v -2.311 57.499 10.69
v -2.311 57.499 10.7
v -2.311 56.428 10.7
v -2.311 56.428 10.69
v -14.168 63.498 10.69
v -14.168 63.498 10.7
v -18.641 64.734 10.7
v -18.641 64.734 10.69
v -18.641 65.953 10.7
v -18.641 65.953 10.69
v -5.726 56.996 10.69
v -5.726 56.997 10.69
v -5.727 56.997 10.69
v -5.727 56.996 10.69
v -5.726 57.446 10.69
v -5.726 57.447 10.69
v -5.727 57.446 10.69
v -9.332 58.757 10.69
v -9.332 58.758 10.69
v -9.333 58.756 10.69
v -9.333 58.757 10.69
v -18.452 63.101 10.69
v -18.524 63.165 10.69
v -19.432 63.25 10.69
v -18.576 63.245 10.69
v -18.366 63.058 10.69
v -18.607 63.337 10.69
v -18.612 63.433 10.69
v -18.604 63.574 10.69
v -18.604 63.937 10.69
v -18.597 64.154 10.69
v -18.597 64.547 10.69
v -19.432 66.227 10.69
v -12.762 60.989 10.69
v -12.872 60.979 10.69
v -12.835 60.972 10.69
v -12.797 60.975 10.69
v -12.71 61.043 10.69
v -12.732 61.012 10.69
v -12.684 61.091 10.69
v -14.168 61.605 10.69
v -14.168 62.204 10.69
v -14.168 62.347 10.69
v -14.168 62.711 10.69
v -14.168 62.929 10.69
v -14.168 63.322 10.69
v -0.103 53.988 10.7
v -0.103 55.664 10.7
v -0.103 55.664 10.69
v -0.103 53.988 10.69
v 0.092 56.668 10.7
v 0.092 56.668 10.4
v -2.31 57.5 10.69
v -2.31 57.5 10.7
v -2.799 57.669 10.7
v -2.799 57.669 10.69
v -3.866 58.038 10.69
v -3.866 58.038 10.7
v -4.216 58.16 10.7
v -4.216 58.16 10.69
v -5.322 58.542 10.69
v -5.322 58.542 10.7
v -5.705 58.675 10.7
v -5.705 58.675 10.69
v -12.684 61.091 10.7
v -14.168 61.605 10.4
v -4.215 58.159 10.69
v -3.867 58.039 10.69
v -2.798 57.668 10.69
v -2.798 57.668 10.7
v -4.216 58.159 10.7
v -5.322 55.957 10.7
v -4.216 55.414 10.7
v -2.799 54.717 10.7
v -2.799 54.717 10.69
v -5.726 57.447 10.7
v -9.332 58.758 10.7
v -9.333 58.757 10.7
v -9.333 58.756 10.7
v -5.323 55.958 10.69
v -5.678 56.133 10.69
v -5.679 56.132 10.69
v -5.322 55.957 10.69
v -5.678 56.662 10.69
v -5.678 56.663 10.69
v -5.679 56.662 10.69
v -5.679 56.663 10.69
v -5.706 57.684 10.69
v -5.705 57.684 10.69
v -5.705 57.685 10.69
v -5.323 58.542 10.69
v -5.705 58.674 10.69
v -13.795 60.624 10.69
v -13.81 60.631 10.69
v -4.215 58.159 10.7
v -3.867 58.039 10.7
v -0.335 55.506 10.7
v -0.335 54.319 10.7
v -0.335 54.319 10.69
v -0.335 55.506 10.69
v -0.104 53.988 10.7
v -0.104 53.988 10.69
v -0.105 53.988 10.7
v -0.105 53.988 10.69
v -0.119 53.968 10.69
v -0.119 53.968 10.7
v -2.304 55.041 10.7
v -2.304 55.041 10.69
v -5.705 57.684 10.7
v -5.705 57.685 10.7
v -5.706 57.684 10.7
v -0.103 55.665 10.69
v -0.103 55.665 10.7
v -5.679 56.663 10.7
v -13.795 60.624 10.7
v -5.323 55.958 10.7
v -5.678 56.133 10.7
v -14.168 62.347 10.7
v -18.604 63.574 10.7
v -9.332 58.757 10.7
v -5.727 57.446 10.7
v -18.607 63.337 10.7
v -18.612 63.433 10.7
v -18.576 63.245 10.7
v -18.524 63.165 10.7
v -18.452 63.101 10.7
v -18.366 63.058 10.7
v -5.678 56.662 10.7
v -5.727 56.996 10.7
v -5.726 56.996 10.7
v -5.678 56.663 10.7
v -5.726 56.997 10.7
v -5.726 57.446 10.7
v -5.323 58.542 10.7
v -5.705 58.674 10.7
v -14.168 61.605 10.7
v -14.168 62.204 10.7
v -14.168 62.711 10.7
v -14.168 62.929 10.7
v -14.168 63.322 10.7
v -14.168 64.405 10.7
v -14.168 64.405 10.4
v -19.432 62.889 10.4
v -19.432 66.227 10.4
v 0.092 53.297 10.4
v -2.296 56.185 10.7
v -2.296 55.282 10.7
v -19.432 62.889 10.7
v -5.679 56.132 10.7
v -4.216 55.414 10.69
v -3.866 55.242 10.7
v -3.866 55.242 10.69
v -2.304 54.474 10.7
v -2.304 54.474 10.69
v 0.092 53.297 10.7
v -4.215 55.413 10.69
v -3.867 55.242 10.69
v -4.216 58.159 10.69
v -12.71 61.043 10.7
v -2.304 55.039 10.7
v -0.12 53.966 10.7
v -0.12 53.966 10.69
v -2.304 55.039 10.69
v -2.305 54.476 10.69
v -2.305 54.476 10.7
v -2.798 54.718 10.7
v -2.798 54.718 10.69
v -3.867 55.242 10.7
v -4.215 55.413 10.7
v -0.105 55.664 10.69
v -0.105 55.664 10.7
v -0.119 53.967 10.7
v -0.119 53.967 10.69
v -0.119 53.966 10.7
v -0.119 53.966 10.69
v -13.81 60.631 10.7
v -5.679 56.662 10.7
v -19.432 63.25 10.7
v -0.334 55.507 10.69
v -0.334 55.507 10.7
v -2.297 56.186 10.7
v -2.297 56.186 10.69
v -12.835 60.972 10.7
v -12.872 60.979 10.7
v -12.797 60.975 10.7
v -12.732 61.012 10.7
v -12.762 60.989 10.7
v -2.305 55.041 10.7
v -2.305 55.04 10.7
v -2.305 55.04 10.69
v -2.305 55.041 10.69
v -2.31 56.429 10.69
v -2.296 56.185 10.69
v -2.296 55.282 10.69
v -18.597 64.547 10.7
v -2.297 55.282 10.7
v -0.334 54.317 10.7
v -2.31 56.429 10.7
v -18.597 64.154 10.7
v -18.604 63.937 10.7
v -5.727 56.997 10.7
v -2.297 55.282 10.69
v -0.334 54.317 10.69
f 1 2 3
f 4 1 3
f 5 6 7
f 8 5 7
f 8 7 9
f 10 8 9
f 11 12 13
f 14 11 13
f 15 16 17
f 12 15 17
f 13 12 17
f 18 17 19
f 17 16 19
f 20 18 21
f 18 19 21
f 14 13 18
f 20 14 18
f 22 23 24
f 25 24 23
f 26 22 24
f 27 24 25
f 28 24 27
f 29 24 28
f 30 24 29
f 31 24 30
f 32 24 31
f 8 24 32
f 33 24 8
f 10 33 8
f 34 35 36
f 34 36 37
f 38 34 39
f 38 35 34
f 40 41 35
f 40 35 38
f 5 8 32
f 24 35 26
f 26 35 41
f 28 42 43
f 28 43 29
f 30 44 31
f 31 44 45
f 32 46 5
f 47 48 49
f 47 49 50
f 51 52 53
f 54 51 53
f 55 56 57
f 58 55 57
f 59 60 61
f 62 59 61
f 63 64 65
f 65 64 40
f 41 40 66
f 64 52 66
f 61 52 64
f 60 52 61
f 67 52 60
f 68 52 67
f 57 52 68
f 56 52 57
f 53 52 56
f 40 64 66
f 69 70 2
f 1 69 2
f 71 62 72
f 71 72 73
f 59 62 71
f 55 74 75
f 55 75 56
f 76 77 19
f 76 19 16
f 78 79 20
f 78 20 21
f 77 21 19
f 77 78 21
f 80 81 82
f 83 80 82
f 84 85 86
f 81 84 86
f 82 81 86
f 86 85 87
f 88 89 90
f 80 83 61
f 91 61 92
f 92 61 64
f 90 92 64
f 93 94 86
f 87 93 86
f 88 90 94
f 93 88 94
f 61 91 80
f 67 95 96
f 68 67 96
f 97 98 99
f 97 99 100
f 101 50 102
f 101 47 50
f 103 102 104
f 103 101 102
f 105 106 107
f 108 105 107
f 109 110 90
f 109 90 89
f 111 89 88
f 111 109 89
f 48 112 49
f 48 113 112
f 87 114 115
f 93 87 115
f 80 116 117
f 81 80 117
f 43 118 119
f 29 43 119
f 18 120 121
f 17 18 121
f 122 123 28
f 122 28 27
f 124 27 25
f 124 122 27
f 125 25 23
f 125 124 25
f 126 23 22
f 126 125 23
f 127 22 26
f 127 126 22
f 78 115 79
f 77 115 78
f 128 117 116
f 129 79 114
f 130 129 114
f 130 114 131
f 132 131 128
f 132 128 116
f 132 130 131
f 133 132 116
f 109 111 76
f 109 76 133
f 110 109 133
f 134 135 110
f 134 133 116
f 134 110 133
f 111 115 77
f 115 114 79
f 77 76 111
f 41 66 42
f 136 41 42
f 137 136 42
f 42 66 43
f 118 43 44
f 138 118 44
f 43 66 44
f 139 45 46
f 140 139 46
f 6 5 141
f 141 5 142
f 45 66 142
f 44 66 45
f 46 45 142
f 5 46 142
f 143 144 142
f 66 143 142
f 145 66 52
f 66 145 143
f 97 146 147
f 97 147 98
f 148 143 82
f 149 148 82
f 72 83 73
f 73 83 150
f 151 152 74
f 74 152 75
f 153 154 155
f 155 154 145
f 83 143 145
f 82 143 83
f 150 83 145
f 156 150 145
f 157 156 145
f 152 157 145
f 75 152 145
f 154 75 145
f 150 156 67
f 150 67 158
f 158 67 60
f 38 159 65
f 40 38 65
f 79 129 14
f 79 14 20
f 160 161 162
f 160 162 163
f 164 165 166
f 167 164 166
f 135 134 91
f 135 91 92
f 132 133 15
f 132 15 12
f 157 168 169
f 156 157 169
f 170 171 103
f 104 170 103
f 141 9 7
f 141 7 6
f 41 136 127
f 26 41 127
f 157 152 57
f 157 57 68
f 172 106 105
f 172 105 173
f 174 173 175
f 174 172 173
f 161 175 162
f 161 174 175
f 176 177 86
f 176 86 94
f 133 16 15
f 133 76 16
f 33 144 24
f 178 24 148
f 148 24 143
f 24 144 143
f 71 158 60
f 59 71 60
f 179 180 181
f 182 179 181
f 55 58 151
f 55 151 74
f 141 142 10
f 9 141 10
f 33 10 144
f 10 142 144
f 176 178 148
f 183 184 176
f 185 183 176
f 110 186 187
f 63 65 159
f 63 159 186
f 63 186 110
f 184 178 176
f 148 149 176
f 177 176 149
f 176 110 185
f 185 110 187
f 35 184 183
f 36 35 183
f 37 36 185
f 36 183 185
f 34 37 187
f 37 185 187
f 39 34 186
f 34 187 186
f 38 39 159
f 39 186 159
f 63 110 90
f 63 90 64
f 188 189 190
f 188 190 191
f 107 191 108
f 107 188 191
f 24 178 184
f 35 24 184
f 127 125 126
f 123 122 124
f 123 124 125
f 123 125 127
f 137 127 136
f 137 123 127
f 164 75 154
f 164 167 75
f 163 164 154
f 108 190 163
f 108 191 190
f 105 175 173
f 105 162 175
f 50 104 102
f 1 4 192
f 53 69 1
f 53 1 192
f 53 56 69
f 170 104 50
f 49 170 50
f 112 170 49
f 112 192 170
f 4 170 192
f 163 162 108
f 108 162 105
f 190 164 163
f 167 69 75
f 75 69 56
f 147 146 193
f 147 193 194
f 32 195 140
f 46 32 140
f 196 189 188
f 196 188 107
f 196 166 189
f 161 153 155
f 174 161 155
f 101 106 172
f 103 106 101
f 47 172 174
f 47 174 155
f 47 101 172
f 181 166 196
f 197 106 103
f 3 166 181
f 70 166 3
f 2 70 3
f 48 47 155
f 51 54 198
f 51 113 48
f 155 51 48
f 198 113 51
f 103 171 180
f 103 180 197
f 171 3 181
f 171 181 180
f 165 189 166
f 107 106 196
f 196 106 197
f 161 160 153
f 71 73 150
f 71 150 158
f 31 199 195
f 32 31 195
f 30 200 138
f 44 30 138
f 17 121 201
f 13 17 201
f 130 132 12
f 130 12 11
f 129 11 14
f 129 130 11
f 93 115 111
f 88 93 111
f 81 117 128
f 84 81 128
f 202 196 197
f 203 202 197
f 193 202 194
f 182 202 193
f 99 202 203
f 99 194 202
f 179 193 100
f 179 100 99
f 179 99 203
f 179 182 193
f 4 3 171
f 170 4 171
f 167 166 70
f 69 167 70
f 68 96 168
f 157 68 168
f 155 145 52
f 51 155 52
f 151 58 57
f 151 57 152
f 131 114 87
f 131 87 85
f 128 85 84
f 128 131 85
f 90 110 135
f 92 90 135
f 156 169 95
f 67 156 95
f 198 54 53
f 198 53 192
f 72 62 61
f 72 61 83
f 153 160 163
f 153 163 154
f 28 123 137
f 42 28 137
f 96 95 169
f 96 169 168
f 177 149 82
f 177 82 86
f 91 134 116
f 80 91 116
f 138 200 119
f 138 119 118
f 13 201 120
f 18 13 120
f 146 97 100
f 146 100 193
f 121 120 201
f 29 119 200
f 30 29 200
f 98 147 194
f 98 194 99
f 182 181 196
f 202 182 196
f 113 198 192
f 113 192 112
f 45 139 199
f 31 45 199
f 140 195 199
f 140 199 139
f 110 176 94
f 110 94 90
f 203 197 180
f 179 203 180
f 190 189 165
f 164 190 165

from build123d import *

# Parameters (mm, degrees)
PAD004_DEPTH    = 0.3
POCKET012_DEPTH = 0.01
POCKET013_DEPTH = 0.01


with BuildPart() as part:
    # Sketch014 (on Face1 of Binder004) → Pad004 (new body)
    with BuildSketch(Plane.XY.offset(10.4)):
        Polygon((-19.4323216564, 66.2270001367), (-19.4323216564, 62.889181066), (0.0923997574, 53.2967653506), (0.0923997574, 56.6681716802), (-14.1681248714, 61.6047050946), (-14.1681248714, 64.4047050946), align=None)
    extrude(amount=PAD004_DEPTH)

    # Sketch015 (on Face8 of Pad004) → Pocket012 (cut)
    with BuildSketch(Plane.XY.offset(10.7)):
        Polygon((-5.32199, 58.5424586824), (-5.32199, 55.9568328772), (-5.679085, 56.1322721891), (-5.679085, 56.662136), (-13.809804, 60.630539), (-5.70539, 57.684792), (-5.70539, 58.6751793894), align=None)
        with BuildLine():
            ThreePointArc((-5.7045356509, 57.6847918915), (-5.7048998518, 57.6840920792), (-5.7056819786, 57.6839888464))
            Line((-13.794928, 60.624184), (-5.7056819786, 57.6839888464))
            Line((-5.6787103299, 56.6629035278), (-13.794928, 60.624184))
            ThreePointArc((-5.6787103299, 56.6629035278), (-5.6783605329, 56.6625884398), (-5.6782307979, 56.6621358835))
            Line((-5.6782307759, 56.1328043107), (-5.6782307979, 56.6621358835))
            Line((-5.3228443024, 55.9582044294), (-5.6782307759, 56.1328043107))
            Line((-5.3228443024, 58.5418503733), (-5.3228443024, 55.9582044294))
            Line((-5.3228443024, 58.5418503733), (-5.704535674, 58.6739796165))
            Line((-5.7045356509, 57.6847918915), (-5.704535674, 58.6739796165))
        make_face(mode=Mode.SUBTRACT)
        Polygon((-2.2970993786, 56.1862906865), (-2.2970993786, 55.2818480058), (-0.333954854, 54.3173631361), (-0.333954854, 55.5067134062), align=None)
        Polygon((-0.3348091564, 55.5061050972), (-2.2962450762, 56.1850909136), (-2.2962450762, 55.2823801275), (-0.3348091564, 54.3187346883), align=None, mode=Mode.SUBTRACT)
        with BuildLine():
            Line((-4.2160763024, 55.4130822888), (-4.2160763024, 58.1593313181))
            ThreePointArc((-4.2160763024, 58.1593313181), (-4.215717524, 58.1600272266), (-4.2149425386, 58.1601386186))
            Line((-4.2149425386, 58.1601386186), (-3.8666805386, 58.0395815532))
            ThreePointArc((-3.8666805386, 58.0395815532), (-3.8662640915, 58.0392697768), (-3.8661056976, 58.0387742527))
            Line((-3.8661056976, 58.0387742527), (-3.8661056976, 55.2419825937))
            ThreePointArc((-3.8661056976, 55.2419825937), (-3.8665083304, 55.2412574542), (-3.8673367072, 55.2412158314))
            Line((-3.8673367072, 55.2412158314), (-4.2155987072, 55.4123155266))
            ThreePointArc((-4.2155987072, 55.4123155266), (-4.2159471395, 55.4126306192), (-4.2160763024, 55.4130822888))
        make_face()
        Polygon((-4.215222, 58.1593313181), (-3.86696, 58.0387742527), (-3.86696, 55.2419825937), (-4.215222, 55.4130822888), align=None, mode=Mode.SUBTRACT)
        with BuildLine():
            Line((-2.3108072707, 56.4275985411), (-0.1046298954, 55.663891131))
            Line((-0.1046298954, 55.663891131), (-0.1046298954, 53.988499))
            ThreePointArc((-0.1029212905, 53.988499), (-0.103775593, 53.9876446976), (-0.1046298954, 53.988499))
            Line((-0.1029212905, 55.66449944), (-0.1029212905, 53.988499))
            ThreePointArc((-0.1034961316, 55.6653067405), (-0.1030796845, 55.664994964), (-0.1029212905, 55.66449944))
            Line((-2.3096735069, 56.4290141506), (-0.1034961316, 55.6653067405))
            Line((-2.3096735069, 57.4999876571), (-2.3096735069, 56.4290141506))
            ThreePointArc((-2.310248348, 57.5007949576), (-2.3098319009, 57.5004831812), (-2.3096735069, 57.4999876571))
            Line((-2.7982585386, 57.6697283366), (-2.310248348, 57.5007949576))
            ThreePointArc((-2.7993923024, 57.6689210362), (-2.799033524, 57.6696169446), (-2.7982585386, 57.6697283366))
            Line((-2.7993923024, 54.7170712382), (-2.7993923024, 57.6689210362))
            ThreePointArc((-2.7989147072, 54.7163044759), (-2.7992631395, 54.7166195686), (-2.7993923024, 54.7170712382))
            Line((-2.3048370768, 54.4735661584), (-2.7989147072, 54.7163044759))
            ThreePointArc((-2.3036060672, 54.4743329206), (-2.3040087001, 54.4736077812), (-2.3048370768, 54.4735661584))
            Line((-2.3036060672, 55.0388730164), (-2.3036060672, 54.4743329206))
            Line((-0.1198963375, 53.9660253641), (-2.3036060672, 55.0388730164))
            ThreePointArc((-0.1191429232, 53.9675588887), (-0.1187528681, 53.9664154192), (-0.1198963375, 53.9660253641))
            Line((-0.1191429232, 53.9675588887), (-2.3040836625, 55.0410113309))
            ThreePointArc((-2.3053146721, 55.0402445686), (-2.3049120393, 55.0409697081), (-2.3040836625, 55.0410113309))
            Line((-2.3053146721, 55.0402445686), (-2.3053146721, 54.4757044729))
            Line((-2.3053146721, 54.4757044729), (-2.7976836976, 54.7176033598))
            Line((-2.7976836976, 54.7176033598), (-2.7976836976, 57.6677212633))
            Line((-2.7976836976, 57.6677212633), (-2.3113821118, 57.4993793481))
            Line((-2.3113821118, 57.4993793481), (-2.3113821118, 56.4284058416))
            ThreePointArc((-2.3108072707, 56.4275985411), (-2.3112237178, 56.4279103175), (-2.3113821118, 56.4284058416))
        make_face()
        with BuildLine():
            Line((-9.3319051629, 58.7575064225), (-5.7263271629, 57.4469711295))
            ThreePointArc((-5.7263271629, 57.4469711295), (-5.7259193037, 57.4466583808), (-5.7257646976, 57.4461682199))
            Line((-5.7257646976, 57.4461682199), (-5.7257646976, 56.99691))
            ThreePointArc((-5.7257646976, 56.99691), (-5.726166389, 56.9961854478), (-5.7269937141, 56.9961422617))
            Line((-5.7269937141, 56.9961422617), (-9.3325717141, 58.7559357747))
            ThreePointArc((-9.3325717141, 58.7559357747), (-9.3329834164, 58.7570372522), (-9.3319051629, 58.7575064225))
        make_face()
        Polygon((-5.726619, 57.4461682199), (-5.726619, 56.99691), (-9.332197, 58.756703513), align=None, mode=Mode.SUBTRACT)
    extrude(amount=-POCKET012_DEPTH, mode=Mode.SUBTRACT)

    # Sketch016 (on Face4 of Pocket012) → Pocket013 (cut)
    with BuildSketch(Plane.XY.offset(10.7)):
        with BuildLine():
            Line((-19.4323216564, 63.2499658189), (-12.8720600429, 60.9790149594))
            ThreePointArc((-12.8720600429, 60.9790149594), (-12.7790236517, 60.9809560026), (-12.7096240402, 61.042949806))
            Line((-12.7096240402, 61.042949806), (-12.6841440979, 61.0909988415))
            Line((-12.6841440979, 61.0909988415), (-18.3657134505, 63.0577747972))
            ThreePointArc((-18.6118935069, 63.4329028915), (-18.5526656913, 63.2034288852), (-18.3657134505, 63.0577747972))
            Line((-18.6118935069, 63.4329028915), (-14.1681248714, 62.2040371833))
            Line((-14.1681248714, 62.2040371833), (-14.1681248714, 62.3470925882))
            Line((-14.1681248714, 62.3470925882), (-18.6042335567, 63.5738400381))
            Line((-18.6042335567, 63.5738400381), (-18.6042335567, 63.9373279196))
            Line((-18.6042335567, 63.9373279196), (-14.1681248714, 62.7105804697))
            Line((-14.1681248714, 62.7105804697), (-14.1681248714, 62.9288591633))
            Line((-14.1681248714, 62.9288591633), (-18.5969110965, 64.1535816832))
            Line((-18.5969110965, 64.1535816832), (-18.5969110965, 64.5465445194))
            Line((-18.5969110965, 64.5465445194), (-14.1681248714, 63.3218219995))
            Line((-14.1681248714, 63.3218219995), (-14.1681248714, 63.497559))
            Line((-14.1681248714, 63.497559), (-18.6405480925, 64.7343487566))
            Line((-18.6405480925, 64.7343487566), (-18.6405480925, 65.9529136808))
            Line((-18.6405480925, 65.9529136808), (-19.432322, 66.227))
            Line((-19.432322, 66.227), (-19.4323216564, 63.2499658189))
        make_face()
    extrude(amount=-POCKET013_DEPTH, mode=Mode.SUBTRACT)


solid = part.part
